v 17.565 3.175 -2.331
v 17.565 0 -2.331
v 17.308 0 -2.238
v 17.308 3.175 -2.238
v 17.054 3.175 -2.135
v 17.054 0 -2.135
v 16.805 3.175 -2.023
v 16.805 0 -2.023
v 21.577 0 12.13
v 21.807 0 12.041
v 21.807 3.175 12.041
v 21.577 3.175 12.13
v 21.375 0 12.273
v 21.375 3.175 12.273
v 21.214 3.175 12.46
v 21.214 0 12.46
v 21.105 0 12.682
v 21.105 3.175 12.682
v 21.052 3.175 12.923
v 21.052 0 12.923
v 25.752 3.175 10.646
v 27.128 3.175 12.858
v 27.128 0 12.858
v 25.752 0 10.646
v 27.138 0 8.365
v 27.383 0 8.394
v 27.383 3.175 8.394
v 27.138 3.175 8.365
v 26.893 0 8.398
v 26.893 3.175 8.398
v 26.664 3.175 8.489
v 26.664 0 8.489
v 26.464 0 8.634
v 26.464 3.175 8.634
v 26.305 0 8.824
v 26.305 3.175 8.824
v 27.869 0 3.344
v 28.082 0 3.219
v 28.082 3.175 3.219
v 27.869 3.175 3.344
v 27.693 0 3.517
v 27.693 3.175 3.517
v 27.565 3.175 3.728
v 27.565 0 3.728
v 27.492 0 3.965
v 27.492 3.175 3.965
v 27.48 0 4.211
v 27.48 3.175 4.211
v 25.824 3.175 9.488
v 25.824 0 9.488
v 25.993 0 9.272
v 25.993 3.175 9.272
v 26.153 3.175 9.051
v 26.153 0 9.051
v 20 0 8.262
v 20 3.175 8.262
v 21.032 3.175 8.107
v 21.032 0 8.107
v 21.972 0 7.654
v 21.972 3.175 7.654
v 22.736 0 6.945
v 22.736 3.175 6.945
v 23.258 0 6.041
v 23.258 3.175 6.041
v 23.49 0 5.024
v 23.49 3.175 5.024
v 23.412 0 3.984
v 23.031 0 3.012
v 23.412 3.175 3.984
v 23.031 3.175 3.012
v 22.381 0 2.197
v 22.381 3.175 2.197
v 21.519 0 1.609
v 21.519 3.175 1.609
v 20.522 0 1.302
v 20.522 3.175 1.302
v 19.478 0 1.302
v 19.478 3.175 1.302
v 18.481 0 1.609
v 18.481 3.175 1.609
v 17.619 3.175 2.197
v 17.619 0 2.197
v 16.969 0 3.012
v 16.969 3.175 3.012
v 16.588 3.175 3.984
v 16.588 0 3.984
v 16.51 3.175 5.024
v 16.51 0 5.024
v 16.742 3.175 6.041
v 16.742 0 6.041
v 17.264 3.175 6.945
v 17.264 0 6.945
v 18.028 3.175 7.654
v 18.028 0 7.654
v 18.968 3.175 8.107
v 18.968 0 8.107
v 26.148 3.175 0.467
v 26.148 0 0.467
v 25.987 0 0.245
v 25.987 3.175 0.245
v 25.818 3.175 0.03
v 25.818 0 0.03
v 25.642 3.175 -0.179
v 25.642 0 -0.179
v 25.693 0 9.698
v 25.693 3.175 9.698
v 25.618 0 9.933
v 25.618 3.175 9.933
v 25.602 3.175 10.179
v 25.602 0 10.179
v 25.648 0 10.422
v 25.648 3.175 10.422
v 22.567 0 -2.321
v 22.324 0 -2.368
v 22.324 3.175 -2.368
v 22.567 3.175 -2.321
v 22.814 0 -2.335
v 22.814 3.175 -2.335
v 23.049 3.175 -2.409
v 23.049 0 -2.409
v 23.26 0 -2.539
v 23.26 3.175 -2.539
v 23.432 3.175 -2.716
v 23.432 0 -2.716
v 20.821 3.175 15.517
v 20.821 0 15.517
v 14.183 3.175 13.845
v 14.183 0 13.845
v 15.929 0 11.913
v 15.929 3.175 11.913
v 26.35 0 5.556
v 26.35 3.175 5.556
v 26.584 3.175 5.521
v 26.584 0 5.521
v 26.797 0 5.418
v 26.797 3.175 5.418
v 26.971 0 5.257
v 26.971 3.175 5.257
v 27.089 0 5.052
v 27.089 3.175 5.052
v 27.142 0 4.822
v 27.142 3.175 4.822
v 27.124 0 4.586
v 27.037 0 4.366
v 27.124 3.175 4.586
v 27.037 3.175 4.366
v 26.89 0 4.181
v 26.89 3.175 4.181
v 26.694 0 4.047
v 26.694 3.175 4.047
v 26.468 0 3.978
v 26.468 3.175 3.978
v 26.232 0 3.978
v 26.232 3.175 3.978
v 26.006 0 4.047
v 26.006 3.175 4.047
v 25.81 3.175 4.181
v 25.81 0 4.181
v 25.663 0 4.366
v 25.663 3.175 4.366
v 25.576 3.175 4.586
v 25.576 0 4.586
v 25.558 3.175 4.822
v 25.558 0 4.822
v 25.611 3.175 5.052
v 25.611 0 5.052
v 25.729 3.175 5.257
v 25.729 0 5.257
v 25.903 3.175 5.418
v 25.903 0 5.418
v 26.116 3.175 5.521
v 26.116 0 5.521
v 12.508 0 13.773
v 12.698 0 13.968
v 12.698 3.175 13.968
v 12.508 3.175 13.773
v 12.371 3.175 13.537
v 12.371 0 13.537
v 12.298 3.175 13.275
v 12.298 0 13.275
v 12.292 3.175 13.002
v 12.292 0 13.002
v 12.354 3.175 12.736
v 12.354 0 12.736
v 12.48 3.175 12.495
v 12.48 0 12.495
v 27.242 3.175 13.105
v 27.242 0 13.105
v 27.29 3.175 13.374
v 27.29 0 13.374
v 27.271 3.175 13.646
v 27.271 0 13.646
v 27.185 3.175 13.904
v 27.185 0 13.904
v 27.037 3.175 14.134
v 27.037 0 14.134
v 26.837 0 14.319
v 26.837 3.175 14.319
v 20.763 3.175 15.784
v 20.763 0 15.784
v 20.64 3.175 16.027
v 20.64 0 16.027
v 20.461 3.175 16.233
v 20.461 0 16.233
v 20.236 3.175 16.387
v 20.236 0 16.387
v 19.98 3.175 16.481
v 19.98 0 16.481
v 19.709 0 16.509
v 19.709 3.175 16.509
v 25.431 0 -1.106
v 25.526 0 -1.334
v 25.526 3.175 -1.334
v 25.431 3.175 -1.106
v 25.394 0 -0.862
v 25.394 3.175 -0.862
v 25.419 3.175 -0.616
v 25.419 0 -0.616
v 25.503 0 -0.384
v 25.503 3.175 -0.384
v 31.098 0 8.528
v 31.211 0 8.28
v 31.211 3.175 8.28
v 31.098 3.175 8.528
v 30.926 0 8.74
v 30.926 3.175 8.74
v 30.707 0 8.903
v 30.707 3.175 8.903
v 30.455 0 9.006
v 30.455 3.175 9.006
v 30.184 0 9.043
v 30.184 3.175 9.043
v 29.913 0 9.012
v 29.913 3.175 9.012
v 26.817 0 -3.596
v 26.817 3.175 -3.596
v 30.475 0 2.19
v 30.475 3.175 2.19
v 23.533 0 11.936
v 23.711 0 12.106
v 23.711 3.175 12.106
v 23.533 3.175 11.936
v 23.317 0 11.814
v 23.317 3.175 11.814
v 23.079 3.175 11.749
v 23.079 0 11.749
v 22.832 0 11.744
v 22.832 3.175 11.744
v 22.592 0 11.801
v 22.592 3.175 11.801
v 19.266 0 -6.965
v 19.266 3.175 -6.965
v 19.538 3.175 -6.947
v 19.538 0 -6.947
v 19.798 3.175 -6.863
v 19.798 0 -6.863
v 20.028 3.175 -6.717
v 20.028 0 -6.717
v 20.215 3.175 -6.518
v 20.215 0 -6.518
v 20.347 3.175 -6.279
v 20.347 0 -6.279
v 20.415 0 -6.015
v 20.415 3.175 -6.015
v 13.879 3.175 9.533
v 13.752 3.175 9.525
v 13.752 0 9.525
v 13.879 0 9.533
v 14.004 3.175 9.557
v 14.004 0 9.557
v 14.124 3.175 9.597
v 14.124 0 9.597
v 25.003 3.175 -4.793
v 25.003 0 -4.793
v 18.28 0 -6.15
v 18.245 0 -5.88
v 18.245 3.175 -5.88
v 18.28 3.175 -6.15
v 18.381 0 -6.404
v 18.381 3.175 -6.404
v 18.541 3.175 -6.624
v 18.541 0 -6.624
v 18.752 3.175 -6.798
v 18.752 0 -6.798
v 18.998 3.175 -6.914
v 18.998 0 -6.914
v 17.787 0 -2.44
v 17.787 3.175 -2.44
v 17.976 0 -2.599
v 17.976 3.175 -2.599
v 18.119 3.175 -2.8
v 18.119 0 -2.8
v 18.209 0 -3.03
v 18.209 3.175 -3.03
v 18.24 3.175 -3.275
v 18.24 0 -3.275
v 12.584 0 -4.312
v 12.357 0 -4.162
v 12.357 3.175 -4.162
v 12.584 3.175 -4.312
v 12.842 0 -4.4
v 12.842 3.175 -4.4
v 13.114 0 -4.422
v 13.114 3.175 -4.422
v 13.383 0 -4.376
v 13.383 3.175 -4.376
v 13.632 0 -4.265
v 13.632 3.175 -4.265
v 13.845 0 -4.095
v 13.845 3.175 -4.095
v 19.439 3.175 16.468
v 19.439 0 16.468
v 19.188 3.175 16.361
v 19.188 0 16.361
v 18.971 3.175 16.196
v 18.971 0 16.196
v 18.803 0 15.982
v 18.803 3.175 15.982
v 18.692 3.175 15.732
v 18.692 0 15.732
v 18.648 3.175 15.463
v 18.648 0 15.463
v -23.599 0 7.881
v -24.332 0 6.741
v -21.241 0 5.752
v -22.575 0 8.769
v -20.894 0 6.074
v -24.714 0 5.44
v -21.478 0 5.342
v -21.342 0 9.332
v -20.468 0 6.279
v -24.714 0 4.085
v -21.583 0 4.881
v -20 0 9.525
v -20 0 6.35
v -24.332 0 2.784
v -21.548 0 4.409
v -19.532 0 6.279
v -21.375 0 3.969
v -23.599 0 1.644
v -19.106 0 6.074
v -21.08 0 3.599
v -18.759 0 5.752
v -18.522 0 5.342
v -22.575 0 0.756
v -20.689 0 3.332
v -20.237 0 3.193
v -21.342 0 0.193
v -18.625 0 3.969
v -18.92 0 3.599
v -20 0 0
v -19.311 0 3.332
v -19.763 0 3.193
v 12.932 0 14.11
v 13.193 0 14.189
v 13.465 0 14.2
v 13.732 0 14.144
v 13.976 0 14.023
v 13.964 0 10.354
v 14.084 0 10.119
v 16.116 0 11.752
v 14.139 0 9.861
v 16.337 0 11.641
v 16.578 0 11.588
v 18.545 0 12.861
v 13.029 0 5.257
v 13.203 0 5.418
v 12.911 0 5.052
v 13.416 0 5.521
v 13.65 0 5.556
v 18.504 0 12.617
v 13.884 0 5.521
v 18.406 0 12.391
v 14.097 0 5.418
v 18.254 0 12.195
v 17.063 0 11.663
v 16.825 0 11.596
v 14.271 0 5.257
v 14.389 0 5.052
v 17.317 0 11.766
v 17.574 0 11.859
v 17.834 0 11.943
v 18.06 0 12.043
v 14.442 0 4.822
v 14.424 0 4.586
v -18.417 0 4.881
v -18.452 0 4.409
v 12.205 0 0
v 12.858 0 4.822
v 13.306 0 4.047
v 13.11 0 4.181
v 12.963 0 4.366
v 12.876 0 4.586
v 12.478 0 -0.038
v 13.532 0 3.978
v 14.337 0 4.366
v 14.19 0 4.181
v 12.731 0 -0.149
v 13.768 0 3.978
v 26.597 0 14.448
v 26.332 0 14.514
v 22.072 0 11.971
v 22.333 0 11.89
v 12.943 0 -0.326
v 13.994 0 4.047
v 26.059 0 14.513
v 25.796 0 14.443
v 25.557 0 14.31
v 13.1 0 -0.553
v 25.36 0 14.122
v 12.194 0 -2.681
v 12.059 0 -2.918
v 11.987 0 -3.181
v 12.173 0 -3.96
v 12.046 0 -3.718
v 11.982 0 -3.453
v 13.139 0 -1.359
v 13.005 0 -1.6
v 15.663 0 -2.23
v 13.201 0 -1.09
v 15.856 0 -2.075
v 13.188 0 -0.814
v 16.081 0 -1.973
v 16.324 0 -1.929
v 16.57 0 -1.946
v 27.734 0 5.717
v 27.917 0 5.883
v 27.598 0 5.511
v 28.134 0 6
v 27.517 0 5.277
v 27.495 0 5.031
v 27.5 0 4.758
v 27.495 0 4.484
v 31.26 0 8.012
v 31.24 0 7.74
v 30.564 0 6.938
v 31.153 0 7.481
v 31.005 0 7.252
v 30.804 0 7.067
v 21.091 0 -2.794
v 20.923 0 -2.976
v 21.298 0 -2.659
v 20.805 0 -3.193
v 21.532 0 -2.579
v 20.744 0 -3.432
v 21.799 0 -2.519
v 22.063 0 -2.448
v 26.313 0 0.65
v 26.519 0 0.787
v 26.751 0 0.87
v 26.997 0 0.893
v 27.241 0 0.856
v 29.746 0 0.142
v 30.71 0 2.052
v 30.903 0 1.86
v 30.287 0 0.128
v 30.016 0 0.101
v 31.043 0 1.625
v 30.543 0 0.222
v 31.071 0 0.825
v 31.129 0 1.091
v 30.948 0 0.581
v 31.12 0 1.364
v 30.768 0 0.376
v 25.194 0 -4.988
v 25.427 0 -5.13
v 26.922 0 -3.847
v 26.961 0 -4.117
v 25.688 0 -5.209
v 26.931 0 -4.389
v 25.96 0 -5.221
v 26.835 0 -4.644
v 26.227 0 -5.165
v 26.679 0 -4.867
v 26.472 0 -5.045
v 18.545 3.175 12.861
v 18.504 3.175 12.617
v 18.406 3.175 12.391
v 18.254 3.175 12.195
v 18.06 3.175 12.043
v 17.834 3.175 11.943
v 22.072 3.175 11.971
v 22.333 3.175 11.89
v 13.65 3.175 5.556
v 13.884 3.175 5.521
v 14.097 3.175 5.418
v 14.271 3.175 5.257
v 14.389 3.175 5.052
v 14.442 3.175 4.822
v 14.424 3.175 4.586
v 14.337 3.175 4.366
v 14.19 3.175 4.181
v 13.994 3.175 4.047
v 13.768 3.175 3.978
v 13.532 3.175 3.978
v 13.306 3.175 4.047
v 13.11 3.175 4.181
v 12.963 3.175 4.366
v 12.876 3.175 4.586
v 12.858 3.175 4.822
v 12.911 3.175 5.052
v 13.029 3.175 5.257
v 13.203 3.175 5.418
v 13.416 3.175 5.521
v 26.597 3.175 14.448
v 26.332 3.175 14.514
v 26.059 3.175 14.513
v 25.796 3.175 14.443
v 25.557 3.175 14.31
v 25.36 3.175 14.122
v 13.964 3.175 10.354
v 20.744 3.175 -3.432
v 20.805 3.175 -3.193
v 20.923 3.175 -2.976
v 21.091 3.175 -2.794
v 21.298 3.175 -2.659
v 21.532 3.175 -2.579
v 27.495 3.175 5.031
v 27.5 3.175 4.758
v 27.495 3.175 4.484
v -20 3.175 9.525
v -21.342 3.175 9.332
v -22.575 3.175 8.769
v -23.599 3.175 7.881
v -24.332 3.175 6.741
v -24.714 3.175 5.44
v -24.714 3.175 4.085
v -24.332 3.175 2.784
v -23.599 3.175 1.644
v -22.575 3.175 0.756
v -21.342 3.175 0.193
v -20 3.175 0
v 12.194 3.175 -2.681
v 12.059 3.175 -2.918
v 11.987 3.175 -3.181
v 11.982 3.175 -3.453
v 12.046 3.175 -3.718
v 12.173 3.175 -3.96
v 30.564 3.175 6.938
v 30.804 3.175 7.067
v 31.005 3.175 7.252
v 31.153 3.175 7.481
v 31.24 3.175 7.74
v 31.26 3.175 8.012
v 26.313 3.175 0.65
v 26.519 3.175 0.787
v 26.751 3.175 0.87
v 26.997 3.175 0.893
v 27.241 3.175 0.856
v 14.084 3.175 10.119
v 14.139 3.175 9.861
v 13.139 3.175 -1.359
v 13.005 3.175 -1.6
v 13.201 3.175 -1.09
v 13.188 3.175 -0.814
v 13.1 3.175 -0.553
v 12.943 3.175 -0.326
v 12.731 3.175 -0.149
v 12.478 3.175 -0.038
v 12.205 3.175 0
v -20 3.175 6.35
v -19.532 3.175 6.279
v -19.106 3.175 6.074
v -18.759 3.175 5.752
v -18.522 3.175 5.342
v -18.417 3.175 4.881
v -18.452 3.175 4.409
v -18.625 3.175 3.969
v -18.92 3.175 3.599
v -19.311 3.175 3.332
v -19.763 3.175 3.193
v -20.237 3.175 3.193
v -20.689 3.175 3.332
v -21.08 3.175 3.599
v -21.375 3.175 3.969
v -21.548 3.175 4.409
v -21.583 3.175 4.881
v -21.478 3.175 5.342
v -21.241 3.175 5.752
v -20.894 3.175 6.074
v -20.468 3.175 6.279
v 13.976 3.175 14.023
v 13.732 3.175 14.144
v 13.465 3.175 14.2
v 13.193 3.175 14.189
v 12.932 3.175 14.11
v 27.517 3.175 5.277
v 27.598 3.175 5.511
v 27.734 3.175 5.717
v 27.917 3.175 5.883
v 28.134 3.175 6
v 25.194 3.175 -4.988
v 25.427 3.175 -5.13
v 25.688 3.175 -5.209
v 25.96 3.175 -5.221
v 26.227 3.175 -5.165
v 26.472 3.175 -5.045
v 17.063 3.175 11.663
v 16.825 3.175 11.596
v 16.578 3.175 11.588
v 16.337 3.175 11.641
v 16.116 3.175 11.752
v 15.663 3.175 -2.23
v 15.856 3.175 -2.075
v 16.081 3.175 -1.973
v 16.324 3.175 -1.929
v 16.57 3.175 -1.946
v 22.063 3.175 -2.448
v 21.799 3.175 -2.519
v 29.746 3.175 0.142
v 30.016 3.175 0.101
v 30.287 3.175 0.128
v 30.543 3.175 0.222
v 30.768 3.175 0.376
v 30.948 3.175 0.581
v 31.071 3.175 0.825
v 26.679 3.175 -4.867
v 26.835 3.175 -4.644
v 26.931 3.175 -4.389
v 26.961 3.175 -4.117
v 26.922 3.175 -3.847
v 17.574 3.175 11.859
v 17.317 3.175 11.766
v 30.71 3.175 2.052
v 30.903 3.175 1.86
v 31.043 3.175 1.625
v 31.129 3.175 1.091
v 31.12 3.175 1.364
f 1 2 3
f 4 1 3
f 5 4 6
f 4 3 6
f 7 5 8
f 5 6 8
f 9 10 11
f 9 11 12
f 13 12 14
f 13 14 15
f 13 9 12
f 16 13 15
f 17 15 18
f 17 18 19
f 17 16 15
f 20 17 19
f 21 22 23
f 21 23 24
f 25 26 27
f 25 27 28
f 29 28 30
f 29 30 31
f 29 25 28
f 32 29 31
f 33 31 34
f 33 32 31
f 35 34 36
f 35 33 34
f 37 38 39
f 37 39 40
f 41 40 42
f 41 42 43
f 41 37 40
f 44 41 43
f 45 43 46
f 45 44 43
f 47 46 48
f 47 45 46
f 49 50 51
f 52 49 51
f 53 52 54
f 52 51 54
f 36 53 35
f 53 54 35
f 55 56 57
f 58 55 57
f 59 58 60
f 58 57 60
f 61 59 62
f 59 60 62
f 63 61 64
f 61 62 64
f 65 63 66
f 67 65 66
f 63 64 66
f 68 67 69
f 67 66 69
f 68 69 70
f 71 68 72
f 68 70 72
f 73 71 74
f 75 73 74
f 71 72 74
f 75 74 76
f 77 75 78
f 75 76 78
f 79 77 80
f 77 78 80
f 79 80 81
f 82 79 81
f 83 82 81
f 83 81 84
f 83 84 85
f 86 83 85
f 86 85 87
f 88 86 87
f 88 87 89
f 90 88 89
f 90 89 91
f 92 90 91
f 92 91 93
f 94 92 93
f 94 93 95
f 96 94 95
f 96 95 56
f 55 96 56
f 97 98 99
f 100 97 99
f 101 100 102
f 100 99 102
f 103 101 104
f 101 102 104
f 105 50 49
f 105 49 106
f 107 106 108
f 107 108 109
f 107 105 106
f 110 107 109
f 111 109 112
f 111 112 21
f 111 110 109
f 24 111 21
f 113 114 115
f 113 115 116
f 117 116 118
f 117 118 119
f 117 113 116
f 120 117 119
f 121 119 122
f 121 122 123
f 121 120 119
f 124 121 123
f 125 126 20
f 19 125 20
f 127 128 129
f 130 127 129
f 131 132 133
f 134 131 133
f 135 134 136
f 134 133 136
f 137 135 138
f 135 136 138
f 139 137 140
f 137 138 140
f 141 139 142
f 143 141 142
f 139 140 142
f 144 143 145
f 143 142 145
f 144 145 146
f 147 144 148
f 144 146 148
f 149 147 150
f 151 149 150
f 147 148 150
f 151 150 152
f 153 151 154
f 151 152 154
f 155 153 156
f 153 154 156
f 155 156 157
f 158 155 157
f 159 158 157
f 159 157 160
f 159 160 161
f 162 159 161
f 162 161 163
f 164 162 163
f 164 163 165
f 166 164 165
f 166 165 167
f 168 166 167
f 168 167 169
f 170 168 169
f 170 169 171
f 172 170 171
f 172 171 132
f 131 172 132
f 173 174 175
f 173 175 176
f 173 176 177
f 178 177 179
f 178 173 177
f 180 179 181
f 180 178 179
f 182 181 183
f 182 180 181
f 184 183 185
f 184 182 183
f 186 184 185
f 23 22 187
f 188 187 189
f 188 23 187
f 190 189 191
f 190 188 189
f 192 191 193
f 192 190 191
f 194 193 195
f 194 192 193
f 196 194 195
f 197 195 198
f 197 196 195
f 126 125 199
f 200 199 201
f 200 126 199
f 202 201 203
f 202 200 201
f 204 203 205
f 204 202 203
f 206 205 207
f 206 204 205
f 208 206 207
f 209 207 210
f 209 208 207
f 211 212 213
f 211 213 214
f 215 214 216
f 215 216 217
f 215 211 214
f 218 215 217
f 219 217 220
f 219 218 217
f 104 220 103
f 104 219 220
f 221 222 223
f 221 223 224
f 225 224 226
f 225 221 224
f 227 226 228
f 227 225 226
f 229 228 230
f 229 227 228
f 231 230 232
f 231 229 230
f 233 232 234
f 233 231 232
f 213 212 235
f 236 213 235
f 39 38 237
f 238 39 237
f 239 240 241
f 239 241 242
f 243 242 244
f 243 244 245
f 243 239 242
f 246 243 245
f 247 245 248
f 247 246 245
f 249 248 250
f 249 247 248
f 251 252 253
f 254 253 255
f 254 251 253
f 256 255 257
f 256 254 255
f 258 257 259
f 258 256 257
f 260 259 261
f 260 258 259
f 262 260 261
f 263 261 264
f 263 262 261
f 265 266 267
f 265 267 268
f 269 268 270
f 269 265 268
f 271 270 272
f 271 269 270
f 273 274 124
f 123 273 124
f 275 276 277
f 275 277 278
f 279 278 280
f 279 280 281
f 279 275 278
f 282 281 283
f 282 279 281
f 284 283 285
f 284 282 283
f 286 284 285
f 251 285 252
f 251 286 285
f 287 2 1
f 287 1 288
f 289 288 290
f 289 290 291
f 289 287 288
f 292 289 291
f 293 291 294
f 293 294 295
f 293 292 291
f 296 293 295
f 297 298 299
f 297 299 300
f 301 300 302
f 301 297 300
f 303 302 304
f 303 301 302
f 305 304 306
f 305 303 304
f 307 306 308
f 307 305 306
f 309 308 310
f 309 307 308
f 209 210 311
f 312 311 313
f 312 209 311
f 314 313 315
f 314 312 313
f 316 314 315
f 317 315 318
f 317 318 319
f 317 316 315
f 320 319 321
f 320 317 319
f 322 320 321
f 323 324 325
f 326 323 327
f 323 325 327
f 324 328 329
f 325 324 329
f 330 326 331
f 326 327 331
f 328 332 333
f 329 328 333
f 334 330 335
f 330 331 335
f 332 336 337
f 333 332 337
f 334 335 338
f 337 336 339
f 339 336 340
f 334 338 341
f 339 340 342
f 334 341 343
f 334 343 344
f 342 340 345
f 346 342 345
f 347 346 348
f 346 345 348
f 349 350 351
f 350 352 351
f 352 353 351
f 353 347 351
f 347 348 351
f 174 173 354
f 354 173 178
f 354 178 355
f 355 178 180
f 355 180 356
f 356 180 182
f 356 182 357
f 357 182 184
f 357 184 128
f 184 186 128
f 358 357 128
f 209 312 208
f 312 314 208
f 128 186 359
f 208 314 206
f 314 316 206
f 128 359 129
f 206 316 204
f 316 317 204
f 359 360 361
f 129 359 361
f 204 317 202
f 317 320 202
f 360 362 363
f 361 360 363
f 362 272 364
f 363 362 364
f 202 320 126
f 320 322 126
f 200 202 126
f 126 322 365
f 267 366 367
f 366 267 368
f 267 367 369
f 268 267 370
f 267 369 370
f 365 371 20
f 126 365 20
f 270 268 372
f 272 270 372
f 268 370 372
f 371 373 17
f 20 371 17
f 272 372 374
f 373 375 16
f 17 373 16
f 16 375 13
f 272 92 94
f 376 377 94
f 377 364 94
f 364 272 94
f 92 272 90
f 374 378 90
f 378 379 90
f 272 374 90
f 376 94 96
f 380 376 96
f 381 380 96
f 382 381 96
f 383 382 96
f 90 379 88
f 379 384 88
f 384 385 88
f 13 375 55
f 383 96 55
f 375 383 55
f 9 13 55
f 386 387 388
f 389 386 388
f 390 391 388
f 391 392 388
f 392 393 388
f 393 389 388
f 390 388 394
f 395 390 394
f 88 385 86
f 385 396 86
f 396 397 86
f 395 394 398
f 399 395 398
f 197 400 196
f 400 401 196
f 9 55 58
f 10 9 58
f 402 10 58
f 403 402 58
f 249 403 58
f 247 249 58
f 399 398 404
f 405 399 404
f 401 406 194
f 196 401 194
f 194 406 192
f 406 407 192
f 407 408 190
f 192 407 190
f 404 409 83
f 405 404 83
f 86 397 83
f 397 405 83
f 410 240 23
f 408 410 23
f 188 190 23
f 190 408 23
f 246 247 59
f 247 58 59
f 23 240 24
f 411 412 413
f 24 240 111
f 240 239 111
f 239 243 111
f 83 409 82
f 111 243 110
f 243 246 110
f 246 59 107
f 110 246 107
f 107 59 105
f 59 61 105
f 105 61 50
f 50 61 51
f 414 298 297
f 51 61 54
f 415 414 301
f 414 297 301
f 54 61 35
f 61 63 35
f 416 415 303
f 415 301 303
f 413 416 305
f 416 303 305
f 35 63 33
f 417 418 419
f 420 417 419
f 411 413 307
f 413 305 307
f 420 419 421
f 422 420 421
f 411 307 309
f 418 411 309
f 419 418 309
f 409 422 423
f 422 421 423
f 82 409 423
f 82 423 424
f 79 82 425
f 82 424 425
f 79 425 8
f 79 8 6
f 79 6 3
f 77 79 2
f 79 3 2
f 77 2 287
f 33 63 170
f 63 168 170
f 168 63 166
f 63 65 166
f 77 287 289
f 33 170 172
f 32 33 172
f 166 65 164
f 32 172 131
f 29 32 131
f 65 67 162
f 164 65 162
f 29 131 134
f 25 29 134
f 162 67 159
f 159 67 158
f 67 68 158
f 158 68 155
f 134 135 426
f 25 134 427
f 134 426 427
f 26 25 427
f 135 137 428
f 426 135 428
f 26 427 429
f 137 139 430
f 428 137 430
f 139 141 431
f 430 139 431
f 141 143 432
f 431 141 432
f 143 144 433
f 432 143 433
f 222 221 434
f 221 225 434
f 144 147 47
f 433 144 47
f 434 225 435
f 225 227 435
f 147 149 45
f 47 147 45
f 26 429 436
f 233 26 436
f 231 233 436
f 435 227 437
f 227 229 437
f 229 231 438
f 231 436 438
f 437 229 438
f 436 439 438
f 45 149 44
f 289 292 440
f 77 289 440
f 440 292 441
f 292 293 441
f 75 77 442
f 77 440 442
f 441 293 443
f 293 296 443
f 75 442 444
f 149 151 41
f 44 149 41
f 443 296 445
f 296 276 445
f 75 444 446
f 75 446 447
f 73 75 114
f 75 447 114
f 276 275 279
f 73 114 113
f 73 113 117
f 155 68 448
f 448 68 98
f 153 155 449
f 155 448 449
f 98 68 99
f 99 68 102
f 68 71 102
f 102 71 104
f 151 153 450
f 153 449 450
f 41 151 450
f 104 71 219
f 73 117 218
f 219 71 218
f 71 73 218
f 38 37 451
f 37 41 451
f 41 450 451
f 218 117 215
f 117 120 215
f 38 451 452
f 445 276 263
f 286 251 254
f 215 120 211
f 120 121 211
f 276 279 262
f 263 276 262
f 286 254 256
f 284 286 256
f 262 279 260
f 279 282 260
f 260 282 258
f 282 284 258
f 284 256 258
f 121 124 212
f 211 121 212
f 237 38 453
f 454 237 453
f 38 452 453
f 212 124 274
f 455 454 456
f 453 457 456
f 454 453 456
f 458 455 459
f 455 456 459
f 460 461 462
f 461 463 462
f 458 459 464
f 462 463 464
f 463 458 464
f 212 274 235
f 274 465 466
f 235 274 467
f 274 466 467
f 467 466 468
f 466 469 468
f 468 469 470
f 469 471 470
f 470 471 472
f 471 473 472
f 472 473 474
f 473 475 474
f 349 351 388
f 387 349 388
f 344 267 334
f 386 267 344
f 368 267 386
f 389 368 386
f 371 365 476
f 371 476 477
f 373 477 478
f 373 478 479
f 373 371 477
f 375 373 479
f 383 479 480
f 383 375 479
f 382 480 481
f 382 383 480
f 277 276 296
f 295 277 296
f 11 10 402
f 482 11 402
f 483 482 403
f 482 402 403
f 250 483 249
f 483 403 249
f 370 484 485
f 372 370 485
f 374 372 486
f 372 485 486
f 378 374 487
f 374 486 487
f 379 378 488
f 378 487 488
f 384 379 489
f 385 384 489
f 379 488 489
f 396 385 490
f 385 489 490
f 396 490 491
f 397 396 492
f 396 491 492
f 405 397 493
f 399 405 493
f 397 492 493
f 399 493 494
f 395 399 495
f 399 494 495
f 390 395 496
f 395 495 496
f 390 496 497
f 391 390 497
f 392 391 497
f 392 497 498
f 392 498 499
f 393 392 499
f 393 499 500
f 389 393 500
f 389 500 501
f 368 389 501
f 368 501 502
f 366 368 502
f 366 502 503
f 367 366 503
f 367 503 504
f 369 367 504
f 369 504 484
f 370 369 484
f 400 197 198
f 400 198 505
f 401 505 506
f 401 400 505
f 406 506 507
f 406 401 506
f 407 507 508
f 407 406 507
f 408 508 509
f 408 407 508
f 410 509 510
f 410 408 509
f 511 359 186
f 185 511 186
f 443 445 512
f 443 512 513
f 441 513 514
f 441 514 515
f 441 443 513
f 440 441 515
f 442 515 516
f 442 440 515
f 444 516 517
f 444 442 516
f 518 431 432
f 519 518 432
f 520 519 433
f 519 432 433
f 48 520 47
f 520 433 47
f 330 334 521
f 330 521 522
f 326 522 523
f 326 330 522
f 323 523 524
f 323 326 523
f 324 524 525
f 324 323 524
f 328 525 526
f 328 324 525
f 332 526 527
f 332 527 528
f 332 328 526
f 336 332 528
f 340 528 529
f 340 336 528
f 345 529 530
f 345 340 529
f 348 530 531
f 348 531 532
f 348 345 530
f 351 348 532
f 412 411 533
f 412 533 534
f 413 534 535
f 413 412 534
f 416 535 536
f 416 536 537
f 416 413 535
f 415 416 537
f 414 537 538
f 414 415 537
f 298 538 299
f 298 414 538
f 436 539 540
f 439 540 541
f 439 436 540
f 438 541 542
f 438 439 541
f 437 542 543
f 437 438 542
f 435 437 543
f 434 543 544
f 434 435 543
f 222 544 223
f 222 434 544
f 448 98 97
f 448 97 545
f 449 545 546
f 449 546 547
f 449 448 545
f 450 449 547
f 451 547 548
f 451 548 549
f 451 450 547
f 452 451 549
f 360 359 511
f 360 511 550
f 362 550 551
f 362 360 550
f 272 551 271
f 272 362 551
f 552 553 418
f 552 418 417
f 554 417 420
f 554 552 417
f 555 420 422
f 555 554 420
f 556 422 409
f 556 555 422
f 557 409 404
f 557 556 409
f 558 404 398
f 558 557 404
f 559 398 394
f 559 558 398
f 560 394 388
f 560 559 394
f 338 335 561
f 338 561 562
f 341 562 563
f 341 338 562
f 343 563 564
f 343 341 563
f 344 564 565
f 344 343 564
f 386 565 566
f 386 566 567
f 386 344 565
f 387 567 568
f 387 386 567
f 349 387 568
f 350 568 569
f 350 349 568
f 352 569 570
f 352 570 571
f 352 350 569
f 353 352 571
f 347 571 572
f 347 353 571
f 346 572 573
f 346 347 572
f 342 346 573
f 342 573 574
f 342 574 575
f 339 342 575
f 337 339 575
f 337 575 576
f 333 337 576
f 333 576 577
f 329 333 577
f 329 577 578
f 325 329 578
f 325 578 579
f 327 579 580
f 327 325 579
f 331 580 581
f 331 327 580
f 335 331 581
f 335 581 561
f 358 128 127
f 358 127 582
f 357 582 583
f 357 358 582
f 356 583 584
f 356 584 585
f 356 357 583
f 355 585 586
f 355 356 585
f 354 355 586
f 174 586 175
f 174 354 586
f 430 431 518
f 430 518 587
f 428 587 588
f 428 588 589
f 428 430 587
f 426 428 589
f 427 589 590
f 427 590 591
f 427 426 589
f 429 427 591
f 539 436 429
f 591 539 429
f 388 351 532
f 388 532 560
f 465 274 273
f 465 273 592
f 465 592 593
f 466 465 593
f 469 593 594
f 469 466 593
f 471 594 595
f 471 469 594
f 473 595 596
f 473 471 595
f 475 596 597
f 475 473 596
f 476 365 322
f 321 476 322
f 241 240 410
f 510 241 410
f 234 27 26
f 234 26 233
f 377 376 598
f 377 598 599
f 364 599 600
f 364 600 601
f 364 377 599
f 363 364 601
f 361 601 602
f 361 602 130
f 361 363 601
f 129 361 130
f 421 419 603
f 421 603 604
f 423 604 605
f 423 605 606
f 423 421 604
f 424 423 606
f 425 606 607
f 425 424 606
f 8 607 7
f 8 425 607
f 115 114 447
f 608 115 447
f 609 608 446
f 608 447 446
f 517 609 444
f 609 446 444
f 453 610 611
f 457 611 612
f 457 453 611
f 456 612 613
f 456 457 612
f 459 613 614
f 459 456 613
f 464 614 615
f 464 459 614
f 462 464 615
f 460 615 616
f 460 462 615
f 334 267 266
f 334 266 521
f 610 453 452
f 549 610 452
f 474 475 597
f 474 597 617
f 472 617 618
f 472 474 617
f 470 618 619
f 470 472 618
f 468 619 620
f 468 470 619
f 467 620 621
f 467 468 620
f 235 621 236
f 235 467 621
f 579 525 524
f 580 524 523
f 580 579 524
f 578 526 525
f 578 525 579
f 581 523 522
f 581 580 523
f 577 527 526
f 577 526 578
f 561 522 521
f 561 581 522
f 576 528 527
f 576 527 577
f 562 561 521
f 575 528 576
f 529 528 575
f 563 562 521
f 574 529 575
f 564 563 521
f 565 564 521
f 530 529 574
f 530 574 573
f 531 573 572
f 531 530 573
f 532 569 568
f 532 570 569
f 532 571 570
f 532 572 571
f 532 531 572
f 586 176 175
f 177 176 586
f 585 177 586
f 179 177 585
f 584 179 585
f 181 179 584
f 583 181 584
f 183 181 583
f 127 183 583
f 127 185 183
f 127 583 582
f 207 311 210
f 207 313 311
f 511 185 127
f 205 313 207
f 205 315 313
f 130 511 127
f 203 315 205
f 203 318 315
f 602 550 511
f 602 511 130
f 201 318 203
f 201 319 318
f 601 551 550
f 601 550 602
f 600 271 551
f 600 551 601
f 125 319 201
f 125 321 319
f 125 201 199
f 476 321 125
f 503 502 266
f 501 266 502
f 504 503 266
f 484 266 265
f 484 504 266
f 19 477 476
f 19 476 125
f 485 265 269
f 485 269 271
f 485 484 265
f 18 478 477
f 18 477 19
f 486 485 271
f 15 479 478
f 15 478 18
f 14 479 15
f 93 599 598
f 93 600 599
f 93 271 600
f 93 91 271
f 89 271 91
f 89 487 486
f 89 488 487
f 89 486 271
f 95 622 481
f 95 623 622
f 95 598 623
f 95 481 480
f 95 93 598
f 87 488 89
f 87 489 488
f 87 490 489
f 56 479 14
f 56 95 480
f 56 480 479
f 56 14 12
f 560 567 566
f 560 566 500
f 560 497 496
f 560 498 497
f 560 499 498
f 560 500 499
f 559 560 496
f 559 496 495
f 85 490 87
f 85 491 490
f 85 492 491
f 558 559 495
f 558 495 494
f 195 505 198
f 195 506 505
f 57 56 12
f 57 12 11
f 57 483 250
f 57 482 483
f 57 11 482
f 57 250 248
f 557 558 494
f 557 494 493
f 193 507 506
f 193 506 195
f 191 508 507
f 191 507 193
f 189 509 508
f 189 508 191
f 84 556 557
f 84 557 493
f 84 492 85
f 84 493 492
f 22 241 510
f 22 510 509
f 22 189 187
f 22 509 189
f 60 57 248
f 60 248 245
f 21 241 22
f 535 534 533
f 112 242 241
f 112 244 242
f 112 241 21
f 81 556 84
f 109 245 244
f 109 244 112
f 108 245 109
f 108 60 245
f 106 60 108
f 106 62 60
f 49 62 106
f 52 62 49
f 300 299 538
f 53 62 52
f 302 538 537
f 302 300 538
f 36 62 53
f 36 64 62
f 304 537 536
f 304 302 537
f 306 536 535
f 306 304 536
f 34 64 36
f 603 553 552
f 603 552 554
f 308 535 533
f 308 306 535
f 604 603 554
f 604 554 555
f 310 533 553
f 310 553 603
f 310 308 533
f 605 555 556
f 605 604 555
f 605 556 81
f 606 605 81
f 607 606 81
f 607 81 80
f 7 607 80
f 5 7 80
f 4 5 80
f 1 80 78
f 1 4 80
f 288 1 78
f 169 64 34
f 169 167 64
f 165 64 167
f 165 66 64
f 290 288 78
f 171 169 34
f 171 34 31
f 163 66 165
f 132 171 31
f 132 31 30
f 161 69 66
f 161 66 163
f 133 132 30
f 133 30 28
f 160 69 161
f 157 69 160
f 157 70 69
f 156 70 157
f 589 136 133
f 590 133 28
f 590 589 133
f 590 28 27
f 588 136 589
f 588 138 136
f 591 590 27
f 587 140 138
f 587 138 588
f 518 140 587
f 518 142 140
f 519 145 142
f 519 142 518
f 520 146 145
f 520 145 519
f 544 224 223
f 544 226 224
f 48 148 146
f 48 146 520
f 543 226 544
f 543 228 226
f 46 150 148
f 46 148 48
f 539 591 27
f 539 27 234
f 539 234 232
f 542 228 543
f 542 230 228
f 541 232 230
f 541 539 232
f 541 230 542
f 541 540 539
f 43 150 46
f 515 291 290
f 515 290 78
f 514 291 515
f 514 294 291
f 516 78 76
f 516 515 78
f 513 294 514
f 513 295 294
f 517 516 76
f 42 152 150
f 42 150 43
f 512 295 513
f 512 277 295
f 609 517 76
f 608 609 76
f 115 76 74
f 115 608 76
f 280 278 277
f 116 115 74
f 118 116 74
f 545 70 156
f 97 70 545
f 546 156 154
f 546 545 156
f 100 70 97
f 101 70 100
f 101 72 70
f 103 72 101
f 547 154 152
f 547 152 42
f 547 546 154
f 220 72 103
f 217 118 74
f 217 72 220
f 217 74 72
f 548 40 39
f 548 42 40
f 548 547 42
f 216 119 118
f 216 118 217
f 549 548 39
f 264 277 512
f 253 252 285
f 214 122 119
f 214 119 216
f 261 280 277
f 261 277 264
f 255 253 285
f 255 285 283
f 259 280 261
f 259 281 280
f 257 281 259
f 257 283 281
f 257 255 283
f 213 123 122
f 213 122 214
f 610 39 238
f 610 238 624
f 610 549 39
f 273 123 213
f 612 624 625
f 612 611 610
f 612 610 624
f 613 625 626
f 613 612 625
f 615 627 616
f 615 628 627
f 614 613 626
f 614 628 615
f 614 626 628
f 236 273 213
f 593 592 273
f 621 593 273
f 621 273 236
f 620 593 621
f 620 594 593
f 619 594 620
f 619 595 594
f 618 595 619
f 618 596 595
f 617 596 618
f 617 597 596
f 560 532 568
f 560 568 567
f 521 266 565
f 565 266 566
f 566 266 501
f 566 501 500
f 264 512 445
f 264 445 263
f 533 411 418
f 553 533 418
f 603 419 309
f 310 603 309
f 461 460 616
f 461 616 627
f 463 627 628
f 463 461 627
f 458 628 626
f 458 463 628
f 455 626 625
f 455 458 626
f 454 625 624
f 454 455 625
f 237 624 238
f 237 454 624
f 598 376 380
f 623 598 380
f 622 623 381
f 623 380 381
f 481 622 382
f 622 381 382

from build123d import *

# Parameters (mm, degrees)
CROQUIS1_R              = 1.5875
SALIENTE_EXTRUIR1_DEPTH = 3.175
SALIENTE_EXTRUIR2_START = -3.175
CROQUIS2_R              = 7.5
CROQUIS2_R_2            = 1.5875
SALIENTE_EXTRUIR2_DEPTH = 3.175
CROQUIS7_R              = 3.5
CROQUIS7_R_2            = 0.79375
CORTAR_EXTRUIR3_DEPTH   = 10
SALIENTE_EXTRUIR3_START = -3.175
SALIENTE_EXTRUIR3_DEPTH = 3.175
CORTAR_EXTRUIR4_START   = -10
CORTAR_EXTRUIR4_DEPTH   = 10
MATRIZC1_COUNT          = 8
MATRIZC1_ANGLE          = 259
REDONDEO1_R             = 1


with BuildPart() as part:
    # Croquis1 → Saliente-Extruir1 (new body)
    with BuildSketch(Plane(origin=(0, 0, 0), x_dir=(1, 0, 0), z_dir=(0, 1, 0))):
        with BuildLine():
            Line((-20, 0), (20, 0))
            ThreePointArc((20, 0), (24.7625, -4.7625), (20, -9.525))
            Line((20, -9.525), (-20, -9.525))
            ThreePointArc((-20, -9.525), (-24.7625, -4.7625), (-20, 0))
        make_face()
        with Locations(Location((-20, -4.7625, 0), (0, 0, 270))):
            Circle(CROQUIS1_R, mode=Mode.SUBTRACT)
        with Locations(Location((20, -4.7625, 0), (0, 0, 270))):
            Circle(CROQUIS1_R, mode=Mode.SUBTRACT)
    extrude(amount=SALIENTE_EXTRUIR1_DEPTH)

    # Croquis2 → Saliente-Extruir2 (add)
    with BuildSketch(Plane(origin=(0, 3.175, 0), x_dir=(1, 0, 0), z_dir=(0, 1, 0)).offset(SALIENTE_EXTRUIR2_START)):
        with Locations((20, -4.7625)):
            Circle(CROQUIS2_R)
        with Locations(Location((20, -4.7625, 0), (0, 0, 270))):
            Circle(CROQUIS2_R_2, mode=Mode.SUBTRACT)
    extrude(amount=SALIENTE_EXTRUIR2_DEPTH)

    # Croquis7 → Cortar-Extruir3 (cut)
    with BuildSketch(Plane(origin=(0, 3.175, 0), x_dir=(1, 0, 0), z_dir=(0, 1, 0))):
        with Locations(Location((20, -4.7625, 0), (0, 0, 270))):
            Circle(CROQUIS7_R)
        with Locations(Location((13.65, -4.7625, 0), (0, 0, 270))):
            Circle(CROQUIS7_R_2)
        with Locations(Location((26.35, -4.7625, 0), (0, 0, 270))):
            Circle(CROQUIS7_R_2)
    extrude(amount=-CORTAR_EXTRUIR3_DEPTH, mode=Mode.SUBTRACT)

    # Croquis8 → Saliente-Extruir3 (add)
    with BuildSketch(Plane(origin=(0, 3.175, 0), x_dir=(1, 0, 0), z_dir=(0, 1, 0)).offset(SALIENTE_EXTRUIR3_START)):
        with BuildLine():
            Line((11.607813982, 3.461471902), (14.206158981, 0))
            ThreePointArc((14.206158981, 0), (15.121179891, 0.933736858), (16.184441281, 1.694396442))
            Line((16.184441281, 1.694396442), (13.163387879, 4.793819098))
            ThreePointArc((13.163387879, 4.793819098), (12.356515163, 4.161604411), (11.607813982, 3.461471902))
        make_face()
    saliente_extruir3 = extrude(amount=SALIENTE_EXTRUIR3_DEPTH)

    # Croquis9 → Cortar-Extruir4 (cut)
    with BuildSketch(Plane(origin=(0, 3.175, 0), x_dir=(1, 0, 0), z_dir=(0, 1, 0)).offset(CORTAR_EXTRUIR4_START)):
        with BuildLine():
            ThreePointArc((12.35651523, 4.161604469), (11.974526132, 3.819706546), (11.607813982, 3.461471902))
            Line((11.607813982, 3.461471902), (12.19397403, 2.680599255))
            ThreePointArc((12.19397403, 2.680599255), (11.982381708, 3.453243741), (12.35651523, 4.161604469))
        make_face()
        with BuildLine():
            ThreePointArc((13.163387879, 4.793819098), (12.753054069, 4.486514795), (12.35651523, 4.161604469))
            ThreePointArc((12.35651523, 4.161604469), (13.113956627, 4.422436237), (13.844906618, 4.094621057))
            Line((13.844906618, 4.094621057), (13.163387879, 4.793819098))
        make_face()
    cortar_extruir4 = extrude(amount=CORTAR_EXTRUIR4_DEPTH, mode=Mode.SUBTRACT)

    # MatrizC1: Saliente-Extruir3, Cortar-Extruir4 ×8 about axis
    matrizc1_axis = Axis((20, 0, 4.7625), (0, -1, 0))
    add([saliente_extruir3.rotate(matrizc1_axis, i * MATRIZC1_ANGLE / (MATRIZC1_COUNT - 1)) for i in range(1, MATRIZC1_COUNT)])
    add([cortar_extruir4.rotate(matrizc1_axis, i * MATRIZC1_ANGLE / (MATRIZC1_COUNT - 1)) for i in range(1, MATRIZC1_COUNT)], mode=Mode.SUBTRACT)

    # Redondeo1
    # the kernel refuses this fillet: 1 mm, written as the material it adds along each edge
    with BuildSketch(Plane(origin=(25.155056708, 0, -0.685012307), x_dir=(0.6933697506528057, 0, 0.7205819792915072), z_dir=(0, 1, 0)), Plane(origin=(27.395406089, 0, 3.514313802), x_dir=(0.12009264391370789, 0, 0.9927626891044079), z_dir=(0, 1, 0)), Plane(origin=(26.657411119, 0, 8.216320666), x_dir=(-0.501549250802915, 0, 0.8651290938461349), z_dir=(0, 1, 0)), Plane(origin=(23.238283761, 0, 11.527373856), x_dir=(-0.9212027273713431, 0, 0.389082941136718), z_dir=(0, 1, 0)), Plane(origin=(18.515005687, 0, 12.114016299), x_dir=(-0.9698611692594302, 0, -0.243658187555294), z_dir=(0, 1, 0)), Plane(origin=(14.389777858, 0, 9.739990082), x_dir=(-0.6279284118017822, 0, -0.7782711029275668), z_dir=(0, 1, 0)), Plane(origin=(16.184441281, 0, -1.694396442), x_dir=(0.8837864601497757, 0, -0.4678904710035554), z_dir=(0, 1, 0)), Plane(origin=(20.838616598, 0, -2.690467342), x_dir=(0.9874067650142349, 0, 0.15820202402031353), z_dir=(0, 1, 0))) as redondeo1_piece_1:
        with BuildLine():
            CenterArc((0.748840141, 0.998904162), REDONDEO1_R, 196.368950511, 70.948483307)
            Line((-0.210626698, 0.717082614), (0, 0))
            ThreePointArc((0, 0), (0.351018816, 0.008218784), (0.702037632, 0))
        make_face()
    extrude(amount=3.175)
    with BuildSketch(Plane(origin=(22.981009808, 0, -2.119620351), x_dir=(0.6032966406304949, 0, -0.7975168734289948), z_dir=(0, 1, 0)), Plane(origin=(26.522503707, 0, 1.06021079), x_dir=(0.9617717559465732, 0, -0.2738523132336944), z_dir=(0, 1, 0)), Plane(origin=(27.437196341, 0, 5.731061088), x_dir=(0.9329135130884484, 0, 0.36010050971495355), z_dir=(0, 1, 0)), Plane(origin=(25.35671448, 0, 10.011843767), x_dir=(0.5283439627642348, 0, 0.8490304217226758), z_dir=(0, 1, 0)), Plane(origin=(21.11892846, 0, 12.178563585), x_dir=(-0.0890050127232042, 0, 0.9960311780813601), z_dir=(0, 1, 0)), Plane(origin=(16.430517523, 0, 11.358619681), x_dir=(-0.6705090902301596, 0, 0.7419013141373477), z_dir=(0, 1, 0)), Plane(origin=(18.238976871, 0, -2.527822183), x_dir=(0.0018564846529317855, 0, -0.9999982767308818), z_dir=(0, 1, 0))) as redondeo1_piece_2:
        with BuildLine():
            CenterArc((0.747376131, 1), REDONDEO1_R, 199.051516693, 70.948483307)
            ThreePointArc((-0.197849332, 0.673581828), (-0.091039016, 0.339107144), (0, 0))
            Line((0, 0), (0.747376131, 0))
        make_face()
    extrude(amount=3.175)
    with BuildSketch(Plane(origin=(14.206158981, 3.175, 0), x_dir=(-1, 0, 0), z_dir=(0, -1, 0))) as redondeo1_piece_3:
        with BuildLine():
            CenterArc((REDONDEO1_R * 2.00103600097, REDONDEO1_R), REDONDEO1_R, 143.106368796, 126.893631204)
            Line((REDONDEO1_R * 1.20128460683, REDONDEO1_R * 1.6003313315), (0, 0))
            Line((0, 0), (REDONDEO1_R * 2.00103600097, 0))
        make_face()
    extrude(amount=3.175)
    with BuildSketch(Plane(origin=(14.206158981, 3.175, 9.525), x_dir=(-1, 0, 0), z_dir=(0, -1, 0))) as redondeo1_piece_4:
        with BuildLine():
            CenterArc((0.454646298, -1), REDONDEO1_R, 90, 47.317031956)
            ThreePointArc((-0.280469857, -0.322058824), (-0.137942125, -0.163026135), (0, 0))
            Line((0, 0), (0.454646298, 0))
        make_face()
    extrude(amount=3.175)


solid = part.part
